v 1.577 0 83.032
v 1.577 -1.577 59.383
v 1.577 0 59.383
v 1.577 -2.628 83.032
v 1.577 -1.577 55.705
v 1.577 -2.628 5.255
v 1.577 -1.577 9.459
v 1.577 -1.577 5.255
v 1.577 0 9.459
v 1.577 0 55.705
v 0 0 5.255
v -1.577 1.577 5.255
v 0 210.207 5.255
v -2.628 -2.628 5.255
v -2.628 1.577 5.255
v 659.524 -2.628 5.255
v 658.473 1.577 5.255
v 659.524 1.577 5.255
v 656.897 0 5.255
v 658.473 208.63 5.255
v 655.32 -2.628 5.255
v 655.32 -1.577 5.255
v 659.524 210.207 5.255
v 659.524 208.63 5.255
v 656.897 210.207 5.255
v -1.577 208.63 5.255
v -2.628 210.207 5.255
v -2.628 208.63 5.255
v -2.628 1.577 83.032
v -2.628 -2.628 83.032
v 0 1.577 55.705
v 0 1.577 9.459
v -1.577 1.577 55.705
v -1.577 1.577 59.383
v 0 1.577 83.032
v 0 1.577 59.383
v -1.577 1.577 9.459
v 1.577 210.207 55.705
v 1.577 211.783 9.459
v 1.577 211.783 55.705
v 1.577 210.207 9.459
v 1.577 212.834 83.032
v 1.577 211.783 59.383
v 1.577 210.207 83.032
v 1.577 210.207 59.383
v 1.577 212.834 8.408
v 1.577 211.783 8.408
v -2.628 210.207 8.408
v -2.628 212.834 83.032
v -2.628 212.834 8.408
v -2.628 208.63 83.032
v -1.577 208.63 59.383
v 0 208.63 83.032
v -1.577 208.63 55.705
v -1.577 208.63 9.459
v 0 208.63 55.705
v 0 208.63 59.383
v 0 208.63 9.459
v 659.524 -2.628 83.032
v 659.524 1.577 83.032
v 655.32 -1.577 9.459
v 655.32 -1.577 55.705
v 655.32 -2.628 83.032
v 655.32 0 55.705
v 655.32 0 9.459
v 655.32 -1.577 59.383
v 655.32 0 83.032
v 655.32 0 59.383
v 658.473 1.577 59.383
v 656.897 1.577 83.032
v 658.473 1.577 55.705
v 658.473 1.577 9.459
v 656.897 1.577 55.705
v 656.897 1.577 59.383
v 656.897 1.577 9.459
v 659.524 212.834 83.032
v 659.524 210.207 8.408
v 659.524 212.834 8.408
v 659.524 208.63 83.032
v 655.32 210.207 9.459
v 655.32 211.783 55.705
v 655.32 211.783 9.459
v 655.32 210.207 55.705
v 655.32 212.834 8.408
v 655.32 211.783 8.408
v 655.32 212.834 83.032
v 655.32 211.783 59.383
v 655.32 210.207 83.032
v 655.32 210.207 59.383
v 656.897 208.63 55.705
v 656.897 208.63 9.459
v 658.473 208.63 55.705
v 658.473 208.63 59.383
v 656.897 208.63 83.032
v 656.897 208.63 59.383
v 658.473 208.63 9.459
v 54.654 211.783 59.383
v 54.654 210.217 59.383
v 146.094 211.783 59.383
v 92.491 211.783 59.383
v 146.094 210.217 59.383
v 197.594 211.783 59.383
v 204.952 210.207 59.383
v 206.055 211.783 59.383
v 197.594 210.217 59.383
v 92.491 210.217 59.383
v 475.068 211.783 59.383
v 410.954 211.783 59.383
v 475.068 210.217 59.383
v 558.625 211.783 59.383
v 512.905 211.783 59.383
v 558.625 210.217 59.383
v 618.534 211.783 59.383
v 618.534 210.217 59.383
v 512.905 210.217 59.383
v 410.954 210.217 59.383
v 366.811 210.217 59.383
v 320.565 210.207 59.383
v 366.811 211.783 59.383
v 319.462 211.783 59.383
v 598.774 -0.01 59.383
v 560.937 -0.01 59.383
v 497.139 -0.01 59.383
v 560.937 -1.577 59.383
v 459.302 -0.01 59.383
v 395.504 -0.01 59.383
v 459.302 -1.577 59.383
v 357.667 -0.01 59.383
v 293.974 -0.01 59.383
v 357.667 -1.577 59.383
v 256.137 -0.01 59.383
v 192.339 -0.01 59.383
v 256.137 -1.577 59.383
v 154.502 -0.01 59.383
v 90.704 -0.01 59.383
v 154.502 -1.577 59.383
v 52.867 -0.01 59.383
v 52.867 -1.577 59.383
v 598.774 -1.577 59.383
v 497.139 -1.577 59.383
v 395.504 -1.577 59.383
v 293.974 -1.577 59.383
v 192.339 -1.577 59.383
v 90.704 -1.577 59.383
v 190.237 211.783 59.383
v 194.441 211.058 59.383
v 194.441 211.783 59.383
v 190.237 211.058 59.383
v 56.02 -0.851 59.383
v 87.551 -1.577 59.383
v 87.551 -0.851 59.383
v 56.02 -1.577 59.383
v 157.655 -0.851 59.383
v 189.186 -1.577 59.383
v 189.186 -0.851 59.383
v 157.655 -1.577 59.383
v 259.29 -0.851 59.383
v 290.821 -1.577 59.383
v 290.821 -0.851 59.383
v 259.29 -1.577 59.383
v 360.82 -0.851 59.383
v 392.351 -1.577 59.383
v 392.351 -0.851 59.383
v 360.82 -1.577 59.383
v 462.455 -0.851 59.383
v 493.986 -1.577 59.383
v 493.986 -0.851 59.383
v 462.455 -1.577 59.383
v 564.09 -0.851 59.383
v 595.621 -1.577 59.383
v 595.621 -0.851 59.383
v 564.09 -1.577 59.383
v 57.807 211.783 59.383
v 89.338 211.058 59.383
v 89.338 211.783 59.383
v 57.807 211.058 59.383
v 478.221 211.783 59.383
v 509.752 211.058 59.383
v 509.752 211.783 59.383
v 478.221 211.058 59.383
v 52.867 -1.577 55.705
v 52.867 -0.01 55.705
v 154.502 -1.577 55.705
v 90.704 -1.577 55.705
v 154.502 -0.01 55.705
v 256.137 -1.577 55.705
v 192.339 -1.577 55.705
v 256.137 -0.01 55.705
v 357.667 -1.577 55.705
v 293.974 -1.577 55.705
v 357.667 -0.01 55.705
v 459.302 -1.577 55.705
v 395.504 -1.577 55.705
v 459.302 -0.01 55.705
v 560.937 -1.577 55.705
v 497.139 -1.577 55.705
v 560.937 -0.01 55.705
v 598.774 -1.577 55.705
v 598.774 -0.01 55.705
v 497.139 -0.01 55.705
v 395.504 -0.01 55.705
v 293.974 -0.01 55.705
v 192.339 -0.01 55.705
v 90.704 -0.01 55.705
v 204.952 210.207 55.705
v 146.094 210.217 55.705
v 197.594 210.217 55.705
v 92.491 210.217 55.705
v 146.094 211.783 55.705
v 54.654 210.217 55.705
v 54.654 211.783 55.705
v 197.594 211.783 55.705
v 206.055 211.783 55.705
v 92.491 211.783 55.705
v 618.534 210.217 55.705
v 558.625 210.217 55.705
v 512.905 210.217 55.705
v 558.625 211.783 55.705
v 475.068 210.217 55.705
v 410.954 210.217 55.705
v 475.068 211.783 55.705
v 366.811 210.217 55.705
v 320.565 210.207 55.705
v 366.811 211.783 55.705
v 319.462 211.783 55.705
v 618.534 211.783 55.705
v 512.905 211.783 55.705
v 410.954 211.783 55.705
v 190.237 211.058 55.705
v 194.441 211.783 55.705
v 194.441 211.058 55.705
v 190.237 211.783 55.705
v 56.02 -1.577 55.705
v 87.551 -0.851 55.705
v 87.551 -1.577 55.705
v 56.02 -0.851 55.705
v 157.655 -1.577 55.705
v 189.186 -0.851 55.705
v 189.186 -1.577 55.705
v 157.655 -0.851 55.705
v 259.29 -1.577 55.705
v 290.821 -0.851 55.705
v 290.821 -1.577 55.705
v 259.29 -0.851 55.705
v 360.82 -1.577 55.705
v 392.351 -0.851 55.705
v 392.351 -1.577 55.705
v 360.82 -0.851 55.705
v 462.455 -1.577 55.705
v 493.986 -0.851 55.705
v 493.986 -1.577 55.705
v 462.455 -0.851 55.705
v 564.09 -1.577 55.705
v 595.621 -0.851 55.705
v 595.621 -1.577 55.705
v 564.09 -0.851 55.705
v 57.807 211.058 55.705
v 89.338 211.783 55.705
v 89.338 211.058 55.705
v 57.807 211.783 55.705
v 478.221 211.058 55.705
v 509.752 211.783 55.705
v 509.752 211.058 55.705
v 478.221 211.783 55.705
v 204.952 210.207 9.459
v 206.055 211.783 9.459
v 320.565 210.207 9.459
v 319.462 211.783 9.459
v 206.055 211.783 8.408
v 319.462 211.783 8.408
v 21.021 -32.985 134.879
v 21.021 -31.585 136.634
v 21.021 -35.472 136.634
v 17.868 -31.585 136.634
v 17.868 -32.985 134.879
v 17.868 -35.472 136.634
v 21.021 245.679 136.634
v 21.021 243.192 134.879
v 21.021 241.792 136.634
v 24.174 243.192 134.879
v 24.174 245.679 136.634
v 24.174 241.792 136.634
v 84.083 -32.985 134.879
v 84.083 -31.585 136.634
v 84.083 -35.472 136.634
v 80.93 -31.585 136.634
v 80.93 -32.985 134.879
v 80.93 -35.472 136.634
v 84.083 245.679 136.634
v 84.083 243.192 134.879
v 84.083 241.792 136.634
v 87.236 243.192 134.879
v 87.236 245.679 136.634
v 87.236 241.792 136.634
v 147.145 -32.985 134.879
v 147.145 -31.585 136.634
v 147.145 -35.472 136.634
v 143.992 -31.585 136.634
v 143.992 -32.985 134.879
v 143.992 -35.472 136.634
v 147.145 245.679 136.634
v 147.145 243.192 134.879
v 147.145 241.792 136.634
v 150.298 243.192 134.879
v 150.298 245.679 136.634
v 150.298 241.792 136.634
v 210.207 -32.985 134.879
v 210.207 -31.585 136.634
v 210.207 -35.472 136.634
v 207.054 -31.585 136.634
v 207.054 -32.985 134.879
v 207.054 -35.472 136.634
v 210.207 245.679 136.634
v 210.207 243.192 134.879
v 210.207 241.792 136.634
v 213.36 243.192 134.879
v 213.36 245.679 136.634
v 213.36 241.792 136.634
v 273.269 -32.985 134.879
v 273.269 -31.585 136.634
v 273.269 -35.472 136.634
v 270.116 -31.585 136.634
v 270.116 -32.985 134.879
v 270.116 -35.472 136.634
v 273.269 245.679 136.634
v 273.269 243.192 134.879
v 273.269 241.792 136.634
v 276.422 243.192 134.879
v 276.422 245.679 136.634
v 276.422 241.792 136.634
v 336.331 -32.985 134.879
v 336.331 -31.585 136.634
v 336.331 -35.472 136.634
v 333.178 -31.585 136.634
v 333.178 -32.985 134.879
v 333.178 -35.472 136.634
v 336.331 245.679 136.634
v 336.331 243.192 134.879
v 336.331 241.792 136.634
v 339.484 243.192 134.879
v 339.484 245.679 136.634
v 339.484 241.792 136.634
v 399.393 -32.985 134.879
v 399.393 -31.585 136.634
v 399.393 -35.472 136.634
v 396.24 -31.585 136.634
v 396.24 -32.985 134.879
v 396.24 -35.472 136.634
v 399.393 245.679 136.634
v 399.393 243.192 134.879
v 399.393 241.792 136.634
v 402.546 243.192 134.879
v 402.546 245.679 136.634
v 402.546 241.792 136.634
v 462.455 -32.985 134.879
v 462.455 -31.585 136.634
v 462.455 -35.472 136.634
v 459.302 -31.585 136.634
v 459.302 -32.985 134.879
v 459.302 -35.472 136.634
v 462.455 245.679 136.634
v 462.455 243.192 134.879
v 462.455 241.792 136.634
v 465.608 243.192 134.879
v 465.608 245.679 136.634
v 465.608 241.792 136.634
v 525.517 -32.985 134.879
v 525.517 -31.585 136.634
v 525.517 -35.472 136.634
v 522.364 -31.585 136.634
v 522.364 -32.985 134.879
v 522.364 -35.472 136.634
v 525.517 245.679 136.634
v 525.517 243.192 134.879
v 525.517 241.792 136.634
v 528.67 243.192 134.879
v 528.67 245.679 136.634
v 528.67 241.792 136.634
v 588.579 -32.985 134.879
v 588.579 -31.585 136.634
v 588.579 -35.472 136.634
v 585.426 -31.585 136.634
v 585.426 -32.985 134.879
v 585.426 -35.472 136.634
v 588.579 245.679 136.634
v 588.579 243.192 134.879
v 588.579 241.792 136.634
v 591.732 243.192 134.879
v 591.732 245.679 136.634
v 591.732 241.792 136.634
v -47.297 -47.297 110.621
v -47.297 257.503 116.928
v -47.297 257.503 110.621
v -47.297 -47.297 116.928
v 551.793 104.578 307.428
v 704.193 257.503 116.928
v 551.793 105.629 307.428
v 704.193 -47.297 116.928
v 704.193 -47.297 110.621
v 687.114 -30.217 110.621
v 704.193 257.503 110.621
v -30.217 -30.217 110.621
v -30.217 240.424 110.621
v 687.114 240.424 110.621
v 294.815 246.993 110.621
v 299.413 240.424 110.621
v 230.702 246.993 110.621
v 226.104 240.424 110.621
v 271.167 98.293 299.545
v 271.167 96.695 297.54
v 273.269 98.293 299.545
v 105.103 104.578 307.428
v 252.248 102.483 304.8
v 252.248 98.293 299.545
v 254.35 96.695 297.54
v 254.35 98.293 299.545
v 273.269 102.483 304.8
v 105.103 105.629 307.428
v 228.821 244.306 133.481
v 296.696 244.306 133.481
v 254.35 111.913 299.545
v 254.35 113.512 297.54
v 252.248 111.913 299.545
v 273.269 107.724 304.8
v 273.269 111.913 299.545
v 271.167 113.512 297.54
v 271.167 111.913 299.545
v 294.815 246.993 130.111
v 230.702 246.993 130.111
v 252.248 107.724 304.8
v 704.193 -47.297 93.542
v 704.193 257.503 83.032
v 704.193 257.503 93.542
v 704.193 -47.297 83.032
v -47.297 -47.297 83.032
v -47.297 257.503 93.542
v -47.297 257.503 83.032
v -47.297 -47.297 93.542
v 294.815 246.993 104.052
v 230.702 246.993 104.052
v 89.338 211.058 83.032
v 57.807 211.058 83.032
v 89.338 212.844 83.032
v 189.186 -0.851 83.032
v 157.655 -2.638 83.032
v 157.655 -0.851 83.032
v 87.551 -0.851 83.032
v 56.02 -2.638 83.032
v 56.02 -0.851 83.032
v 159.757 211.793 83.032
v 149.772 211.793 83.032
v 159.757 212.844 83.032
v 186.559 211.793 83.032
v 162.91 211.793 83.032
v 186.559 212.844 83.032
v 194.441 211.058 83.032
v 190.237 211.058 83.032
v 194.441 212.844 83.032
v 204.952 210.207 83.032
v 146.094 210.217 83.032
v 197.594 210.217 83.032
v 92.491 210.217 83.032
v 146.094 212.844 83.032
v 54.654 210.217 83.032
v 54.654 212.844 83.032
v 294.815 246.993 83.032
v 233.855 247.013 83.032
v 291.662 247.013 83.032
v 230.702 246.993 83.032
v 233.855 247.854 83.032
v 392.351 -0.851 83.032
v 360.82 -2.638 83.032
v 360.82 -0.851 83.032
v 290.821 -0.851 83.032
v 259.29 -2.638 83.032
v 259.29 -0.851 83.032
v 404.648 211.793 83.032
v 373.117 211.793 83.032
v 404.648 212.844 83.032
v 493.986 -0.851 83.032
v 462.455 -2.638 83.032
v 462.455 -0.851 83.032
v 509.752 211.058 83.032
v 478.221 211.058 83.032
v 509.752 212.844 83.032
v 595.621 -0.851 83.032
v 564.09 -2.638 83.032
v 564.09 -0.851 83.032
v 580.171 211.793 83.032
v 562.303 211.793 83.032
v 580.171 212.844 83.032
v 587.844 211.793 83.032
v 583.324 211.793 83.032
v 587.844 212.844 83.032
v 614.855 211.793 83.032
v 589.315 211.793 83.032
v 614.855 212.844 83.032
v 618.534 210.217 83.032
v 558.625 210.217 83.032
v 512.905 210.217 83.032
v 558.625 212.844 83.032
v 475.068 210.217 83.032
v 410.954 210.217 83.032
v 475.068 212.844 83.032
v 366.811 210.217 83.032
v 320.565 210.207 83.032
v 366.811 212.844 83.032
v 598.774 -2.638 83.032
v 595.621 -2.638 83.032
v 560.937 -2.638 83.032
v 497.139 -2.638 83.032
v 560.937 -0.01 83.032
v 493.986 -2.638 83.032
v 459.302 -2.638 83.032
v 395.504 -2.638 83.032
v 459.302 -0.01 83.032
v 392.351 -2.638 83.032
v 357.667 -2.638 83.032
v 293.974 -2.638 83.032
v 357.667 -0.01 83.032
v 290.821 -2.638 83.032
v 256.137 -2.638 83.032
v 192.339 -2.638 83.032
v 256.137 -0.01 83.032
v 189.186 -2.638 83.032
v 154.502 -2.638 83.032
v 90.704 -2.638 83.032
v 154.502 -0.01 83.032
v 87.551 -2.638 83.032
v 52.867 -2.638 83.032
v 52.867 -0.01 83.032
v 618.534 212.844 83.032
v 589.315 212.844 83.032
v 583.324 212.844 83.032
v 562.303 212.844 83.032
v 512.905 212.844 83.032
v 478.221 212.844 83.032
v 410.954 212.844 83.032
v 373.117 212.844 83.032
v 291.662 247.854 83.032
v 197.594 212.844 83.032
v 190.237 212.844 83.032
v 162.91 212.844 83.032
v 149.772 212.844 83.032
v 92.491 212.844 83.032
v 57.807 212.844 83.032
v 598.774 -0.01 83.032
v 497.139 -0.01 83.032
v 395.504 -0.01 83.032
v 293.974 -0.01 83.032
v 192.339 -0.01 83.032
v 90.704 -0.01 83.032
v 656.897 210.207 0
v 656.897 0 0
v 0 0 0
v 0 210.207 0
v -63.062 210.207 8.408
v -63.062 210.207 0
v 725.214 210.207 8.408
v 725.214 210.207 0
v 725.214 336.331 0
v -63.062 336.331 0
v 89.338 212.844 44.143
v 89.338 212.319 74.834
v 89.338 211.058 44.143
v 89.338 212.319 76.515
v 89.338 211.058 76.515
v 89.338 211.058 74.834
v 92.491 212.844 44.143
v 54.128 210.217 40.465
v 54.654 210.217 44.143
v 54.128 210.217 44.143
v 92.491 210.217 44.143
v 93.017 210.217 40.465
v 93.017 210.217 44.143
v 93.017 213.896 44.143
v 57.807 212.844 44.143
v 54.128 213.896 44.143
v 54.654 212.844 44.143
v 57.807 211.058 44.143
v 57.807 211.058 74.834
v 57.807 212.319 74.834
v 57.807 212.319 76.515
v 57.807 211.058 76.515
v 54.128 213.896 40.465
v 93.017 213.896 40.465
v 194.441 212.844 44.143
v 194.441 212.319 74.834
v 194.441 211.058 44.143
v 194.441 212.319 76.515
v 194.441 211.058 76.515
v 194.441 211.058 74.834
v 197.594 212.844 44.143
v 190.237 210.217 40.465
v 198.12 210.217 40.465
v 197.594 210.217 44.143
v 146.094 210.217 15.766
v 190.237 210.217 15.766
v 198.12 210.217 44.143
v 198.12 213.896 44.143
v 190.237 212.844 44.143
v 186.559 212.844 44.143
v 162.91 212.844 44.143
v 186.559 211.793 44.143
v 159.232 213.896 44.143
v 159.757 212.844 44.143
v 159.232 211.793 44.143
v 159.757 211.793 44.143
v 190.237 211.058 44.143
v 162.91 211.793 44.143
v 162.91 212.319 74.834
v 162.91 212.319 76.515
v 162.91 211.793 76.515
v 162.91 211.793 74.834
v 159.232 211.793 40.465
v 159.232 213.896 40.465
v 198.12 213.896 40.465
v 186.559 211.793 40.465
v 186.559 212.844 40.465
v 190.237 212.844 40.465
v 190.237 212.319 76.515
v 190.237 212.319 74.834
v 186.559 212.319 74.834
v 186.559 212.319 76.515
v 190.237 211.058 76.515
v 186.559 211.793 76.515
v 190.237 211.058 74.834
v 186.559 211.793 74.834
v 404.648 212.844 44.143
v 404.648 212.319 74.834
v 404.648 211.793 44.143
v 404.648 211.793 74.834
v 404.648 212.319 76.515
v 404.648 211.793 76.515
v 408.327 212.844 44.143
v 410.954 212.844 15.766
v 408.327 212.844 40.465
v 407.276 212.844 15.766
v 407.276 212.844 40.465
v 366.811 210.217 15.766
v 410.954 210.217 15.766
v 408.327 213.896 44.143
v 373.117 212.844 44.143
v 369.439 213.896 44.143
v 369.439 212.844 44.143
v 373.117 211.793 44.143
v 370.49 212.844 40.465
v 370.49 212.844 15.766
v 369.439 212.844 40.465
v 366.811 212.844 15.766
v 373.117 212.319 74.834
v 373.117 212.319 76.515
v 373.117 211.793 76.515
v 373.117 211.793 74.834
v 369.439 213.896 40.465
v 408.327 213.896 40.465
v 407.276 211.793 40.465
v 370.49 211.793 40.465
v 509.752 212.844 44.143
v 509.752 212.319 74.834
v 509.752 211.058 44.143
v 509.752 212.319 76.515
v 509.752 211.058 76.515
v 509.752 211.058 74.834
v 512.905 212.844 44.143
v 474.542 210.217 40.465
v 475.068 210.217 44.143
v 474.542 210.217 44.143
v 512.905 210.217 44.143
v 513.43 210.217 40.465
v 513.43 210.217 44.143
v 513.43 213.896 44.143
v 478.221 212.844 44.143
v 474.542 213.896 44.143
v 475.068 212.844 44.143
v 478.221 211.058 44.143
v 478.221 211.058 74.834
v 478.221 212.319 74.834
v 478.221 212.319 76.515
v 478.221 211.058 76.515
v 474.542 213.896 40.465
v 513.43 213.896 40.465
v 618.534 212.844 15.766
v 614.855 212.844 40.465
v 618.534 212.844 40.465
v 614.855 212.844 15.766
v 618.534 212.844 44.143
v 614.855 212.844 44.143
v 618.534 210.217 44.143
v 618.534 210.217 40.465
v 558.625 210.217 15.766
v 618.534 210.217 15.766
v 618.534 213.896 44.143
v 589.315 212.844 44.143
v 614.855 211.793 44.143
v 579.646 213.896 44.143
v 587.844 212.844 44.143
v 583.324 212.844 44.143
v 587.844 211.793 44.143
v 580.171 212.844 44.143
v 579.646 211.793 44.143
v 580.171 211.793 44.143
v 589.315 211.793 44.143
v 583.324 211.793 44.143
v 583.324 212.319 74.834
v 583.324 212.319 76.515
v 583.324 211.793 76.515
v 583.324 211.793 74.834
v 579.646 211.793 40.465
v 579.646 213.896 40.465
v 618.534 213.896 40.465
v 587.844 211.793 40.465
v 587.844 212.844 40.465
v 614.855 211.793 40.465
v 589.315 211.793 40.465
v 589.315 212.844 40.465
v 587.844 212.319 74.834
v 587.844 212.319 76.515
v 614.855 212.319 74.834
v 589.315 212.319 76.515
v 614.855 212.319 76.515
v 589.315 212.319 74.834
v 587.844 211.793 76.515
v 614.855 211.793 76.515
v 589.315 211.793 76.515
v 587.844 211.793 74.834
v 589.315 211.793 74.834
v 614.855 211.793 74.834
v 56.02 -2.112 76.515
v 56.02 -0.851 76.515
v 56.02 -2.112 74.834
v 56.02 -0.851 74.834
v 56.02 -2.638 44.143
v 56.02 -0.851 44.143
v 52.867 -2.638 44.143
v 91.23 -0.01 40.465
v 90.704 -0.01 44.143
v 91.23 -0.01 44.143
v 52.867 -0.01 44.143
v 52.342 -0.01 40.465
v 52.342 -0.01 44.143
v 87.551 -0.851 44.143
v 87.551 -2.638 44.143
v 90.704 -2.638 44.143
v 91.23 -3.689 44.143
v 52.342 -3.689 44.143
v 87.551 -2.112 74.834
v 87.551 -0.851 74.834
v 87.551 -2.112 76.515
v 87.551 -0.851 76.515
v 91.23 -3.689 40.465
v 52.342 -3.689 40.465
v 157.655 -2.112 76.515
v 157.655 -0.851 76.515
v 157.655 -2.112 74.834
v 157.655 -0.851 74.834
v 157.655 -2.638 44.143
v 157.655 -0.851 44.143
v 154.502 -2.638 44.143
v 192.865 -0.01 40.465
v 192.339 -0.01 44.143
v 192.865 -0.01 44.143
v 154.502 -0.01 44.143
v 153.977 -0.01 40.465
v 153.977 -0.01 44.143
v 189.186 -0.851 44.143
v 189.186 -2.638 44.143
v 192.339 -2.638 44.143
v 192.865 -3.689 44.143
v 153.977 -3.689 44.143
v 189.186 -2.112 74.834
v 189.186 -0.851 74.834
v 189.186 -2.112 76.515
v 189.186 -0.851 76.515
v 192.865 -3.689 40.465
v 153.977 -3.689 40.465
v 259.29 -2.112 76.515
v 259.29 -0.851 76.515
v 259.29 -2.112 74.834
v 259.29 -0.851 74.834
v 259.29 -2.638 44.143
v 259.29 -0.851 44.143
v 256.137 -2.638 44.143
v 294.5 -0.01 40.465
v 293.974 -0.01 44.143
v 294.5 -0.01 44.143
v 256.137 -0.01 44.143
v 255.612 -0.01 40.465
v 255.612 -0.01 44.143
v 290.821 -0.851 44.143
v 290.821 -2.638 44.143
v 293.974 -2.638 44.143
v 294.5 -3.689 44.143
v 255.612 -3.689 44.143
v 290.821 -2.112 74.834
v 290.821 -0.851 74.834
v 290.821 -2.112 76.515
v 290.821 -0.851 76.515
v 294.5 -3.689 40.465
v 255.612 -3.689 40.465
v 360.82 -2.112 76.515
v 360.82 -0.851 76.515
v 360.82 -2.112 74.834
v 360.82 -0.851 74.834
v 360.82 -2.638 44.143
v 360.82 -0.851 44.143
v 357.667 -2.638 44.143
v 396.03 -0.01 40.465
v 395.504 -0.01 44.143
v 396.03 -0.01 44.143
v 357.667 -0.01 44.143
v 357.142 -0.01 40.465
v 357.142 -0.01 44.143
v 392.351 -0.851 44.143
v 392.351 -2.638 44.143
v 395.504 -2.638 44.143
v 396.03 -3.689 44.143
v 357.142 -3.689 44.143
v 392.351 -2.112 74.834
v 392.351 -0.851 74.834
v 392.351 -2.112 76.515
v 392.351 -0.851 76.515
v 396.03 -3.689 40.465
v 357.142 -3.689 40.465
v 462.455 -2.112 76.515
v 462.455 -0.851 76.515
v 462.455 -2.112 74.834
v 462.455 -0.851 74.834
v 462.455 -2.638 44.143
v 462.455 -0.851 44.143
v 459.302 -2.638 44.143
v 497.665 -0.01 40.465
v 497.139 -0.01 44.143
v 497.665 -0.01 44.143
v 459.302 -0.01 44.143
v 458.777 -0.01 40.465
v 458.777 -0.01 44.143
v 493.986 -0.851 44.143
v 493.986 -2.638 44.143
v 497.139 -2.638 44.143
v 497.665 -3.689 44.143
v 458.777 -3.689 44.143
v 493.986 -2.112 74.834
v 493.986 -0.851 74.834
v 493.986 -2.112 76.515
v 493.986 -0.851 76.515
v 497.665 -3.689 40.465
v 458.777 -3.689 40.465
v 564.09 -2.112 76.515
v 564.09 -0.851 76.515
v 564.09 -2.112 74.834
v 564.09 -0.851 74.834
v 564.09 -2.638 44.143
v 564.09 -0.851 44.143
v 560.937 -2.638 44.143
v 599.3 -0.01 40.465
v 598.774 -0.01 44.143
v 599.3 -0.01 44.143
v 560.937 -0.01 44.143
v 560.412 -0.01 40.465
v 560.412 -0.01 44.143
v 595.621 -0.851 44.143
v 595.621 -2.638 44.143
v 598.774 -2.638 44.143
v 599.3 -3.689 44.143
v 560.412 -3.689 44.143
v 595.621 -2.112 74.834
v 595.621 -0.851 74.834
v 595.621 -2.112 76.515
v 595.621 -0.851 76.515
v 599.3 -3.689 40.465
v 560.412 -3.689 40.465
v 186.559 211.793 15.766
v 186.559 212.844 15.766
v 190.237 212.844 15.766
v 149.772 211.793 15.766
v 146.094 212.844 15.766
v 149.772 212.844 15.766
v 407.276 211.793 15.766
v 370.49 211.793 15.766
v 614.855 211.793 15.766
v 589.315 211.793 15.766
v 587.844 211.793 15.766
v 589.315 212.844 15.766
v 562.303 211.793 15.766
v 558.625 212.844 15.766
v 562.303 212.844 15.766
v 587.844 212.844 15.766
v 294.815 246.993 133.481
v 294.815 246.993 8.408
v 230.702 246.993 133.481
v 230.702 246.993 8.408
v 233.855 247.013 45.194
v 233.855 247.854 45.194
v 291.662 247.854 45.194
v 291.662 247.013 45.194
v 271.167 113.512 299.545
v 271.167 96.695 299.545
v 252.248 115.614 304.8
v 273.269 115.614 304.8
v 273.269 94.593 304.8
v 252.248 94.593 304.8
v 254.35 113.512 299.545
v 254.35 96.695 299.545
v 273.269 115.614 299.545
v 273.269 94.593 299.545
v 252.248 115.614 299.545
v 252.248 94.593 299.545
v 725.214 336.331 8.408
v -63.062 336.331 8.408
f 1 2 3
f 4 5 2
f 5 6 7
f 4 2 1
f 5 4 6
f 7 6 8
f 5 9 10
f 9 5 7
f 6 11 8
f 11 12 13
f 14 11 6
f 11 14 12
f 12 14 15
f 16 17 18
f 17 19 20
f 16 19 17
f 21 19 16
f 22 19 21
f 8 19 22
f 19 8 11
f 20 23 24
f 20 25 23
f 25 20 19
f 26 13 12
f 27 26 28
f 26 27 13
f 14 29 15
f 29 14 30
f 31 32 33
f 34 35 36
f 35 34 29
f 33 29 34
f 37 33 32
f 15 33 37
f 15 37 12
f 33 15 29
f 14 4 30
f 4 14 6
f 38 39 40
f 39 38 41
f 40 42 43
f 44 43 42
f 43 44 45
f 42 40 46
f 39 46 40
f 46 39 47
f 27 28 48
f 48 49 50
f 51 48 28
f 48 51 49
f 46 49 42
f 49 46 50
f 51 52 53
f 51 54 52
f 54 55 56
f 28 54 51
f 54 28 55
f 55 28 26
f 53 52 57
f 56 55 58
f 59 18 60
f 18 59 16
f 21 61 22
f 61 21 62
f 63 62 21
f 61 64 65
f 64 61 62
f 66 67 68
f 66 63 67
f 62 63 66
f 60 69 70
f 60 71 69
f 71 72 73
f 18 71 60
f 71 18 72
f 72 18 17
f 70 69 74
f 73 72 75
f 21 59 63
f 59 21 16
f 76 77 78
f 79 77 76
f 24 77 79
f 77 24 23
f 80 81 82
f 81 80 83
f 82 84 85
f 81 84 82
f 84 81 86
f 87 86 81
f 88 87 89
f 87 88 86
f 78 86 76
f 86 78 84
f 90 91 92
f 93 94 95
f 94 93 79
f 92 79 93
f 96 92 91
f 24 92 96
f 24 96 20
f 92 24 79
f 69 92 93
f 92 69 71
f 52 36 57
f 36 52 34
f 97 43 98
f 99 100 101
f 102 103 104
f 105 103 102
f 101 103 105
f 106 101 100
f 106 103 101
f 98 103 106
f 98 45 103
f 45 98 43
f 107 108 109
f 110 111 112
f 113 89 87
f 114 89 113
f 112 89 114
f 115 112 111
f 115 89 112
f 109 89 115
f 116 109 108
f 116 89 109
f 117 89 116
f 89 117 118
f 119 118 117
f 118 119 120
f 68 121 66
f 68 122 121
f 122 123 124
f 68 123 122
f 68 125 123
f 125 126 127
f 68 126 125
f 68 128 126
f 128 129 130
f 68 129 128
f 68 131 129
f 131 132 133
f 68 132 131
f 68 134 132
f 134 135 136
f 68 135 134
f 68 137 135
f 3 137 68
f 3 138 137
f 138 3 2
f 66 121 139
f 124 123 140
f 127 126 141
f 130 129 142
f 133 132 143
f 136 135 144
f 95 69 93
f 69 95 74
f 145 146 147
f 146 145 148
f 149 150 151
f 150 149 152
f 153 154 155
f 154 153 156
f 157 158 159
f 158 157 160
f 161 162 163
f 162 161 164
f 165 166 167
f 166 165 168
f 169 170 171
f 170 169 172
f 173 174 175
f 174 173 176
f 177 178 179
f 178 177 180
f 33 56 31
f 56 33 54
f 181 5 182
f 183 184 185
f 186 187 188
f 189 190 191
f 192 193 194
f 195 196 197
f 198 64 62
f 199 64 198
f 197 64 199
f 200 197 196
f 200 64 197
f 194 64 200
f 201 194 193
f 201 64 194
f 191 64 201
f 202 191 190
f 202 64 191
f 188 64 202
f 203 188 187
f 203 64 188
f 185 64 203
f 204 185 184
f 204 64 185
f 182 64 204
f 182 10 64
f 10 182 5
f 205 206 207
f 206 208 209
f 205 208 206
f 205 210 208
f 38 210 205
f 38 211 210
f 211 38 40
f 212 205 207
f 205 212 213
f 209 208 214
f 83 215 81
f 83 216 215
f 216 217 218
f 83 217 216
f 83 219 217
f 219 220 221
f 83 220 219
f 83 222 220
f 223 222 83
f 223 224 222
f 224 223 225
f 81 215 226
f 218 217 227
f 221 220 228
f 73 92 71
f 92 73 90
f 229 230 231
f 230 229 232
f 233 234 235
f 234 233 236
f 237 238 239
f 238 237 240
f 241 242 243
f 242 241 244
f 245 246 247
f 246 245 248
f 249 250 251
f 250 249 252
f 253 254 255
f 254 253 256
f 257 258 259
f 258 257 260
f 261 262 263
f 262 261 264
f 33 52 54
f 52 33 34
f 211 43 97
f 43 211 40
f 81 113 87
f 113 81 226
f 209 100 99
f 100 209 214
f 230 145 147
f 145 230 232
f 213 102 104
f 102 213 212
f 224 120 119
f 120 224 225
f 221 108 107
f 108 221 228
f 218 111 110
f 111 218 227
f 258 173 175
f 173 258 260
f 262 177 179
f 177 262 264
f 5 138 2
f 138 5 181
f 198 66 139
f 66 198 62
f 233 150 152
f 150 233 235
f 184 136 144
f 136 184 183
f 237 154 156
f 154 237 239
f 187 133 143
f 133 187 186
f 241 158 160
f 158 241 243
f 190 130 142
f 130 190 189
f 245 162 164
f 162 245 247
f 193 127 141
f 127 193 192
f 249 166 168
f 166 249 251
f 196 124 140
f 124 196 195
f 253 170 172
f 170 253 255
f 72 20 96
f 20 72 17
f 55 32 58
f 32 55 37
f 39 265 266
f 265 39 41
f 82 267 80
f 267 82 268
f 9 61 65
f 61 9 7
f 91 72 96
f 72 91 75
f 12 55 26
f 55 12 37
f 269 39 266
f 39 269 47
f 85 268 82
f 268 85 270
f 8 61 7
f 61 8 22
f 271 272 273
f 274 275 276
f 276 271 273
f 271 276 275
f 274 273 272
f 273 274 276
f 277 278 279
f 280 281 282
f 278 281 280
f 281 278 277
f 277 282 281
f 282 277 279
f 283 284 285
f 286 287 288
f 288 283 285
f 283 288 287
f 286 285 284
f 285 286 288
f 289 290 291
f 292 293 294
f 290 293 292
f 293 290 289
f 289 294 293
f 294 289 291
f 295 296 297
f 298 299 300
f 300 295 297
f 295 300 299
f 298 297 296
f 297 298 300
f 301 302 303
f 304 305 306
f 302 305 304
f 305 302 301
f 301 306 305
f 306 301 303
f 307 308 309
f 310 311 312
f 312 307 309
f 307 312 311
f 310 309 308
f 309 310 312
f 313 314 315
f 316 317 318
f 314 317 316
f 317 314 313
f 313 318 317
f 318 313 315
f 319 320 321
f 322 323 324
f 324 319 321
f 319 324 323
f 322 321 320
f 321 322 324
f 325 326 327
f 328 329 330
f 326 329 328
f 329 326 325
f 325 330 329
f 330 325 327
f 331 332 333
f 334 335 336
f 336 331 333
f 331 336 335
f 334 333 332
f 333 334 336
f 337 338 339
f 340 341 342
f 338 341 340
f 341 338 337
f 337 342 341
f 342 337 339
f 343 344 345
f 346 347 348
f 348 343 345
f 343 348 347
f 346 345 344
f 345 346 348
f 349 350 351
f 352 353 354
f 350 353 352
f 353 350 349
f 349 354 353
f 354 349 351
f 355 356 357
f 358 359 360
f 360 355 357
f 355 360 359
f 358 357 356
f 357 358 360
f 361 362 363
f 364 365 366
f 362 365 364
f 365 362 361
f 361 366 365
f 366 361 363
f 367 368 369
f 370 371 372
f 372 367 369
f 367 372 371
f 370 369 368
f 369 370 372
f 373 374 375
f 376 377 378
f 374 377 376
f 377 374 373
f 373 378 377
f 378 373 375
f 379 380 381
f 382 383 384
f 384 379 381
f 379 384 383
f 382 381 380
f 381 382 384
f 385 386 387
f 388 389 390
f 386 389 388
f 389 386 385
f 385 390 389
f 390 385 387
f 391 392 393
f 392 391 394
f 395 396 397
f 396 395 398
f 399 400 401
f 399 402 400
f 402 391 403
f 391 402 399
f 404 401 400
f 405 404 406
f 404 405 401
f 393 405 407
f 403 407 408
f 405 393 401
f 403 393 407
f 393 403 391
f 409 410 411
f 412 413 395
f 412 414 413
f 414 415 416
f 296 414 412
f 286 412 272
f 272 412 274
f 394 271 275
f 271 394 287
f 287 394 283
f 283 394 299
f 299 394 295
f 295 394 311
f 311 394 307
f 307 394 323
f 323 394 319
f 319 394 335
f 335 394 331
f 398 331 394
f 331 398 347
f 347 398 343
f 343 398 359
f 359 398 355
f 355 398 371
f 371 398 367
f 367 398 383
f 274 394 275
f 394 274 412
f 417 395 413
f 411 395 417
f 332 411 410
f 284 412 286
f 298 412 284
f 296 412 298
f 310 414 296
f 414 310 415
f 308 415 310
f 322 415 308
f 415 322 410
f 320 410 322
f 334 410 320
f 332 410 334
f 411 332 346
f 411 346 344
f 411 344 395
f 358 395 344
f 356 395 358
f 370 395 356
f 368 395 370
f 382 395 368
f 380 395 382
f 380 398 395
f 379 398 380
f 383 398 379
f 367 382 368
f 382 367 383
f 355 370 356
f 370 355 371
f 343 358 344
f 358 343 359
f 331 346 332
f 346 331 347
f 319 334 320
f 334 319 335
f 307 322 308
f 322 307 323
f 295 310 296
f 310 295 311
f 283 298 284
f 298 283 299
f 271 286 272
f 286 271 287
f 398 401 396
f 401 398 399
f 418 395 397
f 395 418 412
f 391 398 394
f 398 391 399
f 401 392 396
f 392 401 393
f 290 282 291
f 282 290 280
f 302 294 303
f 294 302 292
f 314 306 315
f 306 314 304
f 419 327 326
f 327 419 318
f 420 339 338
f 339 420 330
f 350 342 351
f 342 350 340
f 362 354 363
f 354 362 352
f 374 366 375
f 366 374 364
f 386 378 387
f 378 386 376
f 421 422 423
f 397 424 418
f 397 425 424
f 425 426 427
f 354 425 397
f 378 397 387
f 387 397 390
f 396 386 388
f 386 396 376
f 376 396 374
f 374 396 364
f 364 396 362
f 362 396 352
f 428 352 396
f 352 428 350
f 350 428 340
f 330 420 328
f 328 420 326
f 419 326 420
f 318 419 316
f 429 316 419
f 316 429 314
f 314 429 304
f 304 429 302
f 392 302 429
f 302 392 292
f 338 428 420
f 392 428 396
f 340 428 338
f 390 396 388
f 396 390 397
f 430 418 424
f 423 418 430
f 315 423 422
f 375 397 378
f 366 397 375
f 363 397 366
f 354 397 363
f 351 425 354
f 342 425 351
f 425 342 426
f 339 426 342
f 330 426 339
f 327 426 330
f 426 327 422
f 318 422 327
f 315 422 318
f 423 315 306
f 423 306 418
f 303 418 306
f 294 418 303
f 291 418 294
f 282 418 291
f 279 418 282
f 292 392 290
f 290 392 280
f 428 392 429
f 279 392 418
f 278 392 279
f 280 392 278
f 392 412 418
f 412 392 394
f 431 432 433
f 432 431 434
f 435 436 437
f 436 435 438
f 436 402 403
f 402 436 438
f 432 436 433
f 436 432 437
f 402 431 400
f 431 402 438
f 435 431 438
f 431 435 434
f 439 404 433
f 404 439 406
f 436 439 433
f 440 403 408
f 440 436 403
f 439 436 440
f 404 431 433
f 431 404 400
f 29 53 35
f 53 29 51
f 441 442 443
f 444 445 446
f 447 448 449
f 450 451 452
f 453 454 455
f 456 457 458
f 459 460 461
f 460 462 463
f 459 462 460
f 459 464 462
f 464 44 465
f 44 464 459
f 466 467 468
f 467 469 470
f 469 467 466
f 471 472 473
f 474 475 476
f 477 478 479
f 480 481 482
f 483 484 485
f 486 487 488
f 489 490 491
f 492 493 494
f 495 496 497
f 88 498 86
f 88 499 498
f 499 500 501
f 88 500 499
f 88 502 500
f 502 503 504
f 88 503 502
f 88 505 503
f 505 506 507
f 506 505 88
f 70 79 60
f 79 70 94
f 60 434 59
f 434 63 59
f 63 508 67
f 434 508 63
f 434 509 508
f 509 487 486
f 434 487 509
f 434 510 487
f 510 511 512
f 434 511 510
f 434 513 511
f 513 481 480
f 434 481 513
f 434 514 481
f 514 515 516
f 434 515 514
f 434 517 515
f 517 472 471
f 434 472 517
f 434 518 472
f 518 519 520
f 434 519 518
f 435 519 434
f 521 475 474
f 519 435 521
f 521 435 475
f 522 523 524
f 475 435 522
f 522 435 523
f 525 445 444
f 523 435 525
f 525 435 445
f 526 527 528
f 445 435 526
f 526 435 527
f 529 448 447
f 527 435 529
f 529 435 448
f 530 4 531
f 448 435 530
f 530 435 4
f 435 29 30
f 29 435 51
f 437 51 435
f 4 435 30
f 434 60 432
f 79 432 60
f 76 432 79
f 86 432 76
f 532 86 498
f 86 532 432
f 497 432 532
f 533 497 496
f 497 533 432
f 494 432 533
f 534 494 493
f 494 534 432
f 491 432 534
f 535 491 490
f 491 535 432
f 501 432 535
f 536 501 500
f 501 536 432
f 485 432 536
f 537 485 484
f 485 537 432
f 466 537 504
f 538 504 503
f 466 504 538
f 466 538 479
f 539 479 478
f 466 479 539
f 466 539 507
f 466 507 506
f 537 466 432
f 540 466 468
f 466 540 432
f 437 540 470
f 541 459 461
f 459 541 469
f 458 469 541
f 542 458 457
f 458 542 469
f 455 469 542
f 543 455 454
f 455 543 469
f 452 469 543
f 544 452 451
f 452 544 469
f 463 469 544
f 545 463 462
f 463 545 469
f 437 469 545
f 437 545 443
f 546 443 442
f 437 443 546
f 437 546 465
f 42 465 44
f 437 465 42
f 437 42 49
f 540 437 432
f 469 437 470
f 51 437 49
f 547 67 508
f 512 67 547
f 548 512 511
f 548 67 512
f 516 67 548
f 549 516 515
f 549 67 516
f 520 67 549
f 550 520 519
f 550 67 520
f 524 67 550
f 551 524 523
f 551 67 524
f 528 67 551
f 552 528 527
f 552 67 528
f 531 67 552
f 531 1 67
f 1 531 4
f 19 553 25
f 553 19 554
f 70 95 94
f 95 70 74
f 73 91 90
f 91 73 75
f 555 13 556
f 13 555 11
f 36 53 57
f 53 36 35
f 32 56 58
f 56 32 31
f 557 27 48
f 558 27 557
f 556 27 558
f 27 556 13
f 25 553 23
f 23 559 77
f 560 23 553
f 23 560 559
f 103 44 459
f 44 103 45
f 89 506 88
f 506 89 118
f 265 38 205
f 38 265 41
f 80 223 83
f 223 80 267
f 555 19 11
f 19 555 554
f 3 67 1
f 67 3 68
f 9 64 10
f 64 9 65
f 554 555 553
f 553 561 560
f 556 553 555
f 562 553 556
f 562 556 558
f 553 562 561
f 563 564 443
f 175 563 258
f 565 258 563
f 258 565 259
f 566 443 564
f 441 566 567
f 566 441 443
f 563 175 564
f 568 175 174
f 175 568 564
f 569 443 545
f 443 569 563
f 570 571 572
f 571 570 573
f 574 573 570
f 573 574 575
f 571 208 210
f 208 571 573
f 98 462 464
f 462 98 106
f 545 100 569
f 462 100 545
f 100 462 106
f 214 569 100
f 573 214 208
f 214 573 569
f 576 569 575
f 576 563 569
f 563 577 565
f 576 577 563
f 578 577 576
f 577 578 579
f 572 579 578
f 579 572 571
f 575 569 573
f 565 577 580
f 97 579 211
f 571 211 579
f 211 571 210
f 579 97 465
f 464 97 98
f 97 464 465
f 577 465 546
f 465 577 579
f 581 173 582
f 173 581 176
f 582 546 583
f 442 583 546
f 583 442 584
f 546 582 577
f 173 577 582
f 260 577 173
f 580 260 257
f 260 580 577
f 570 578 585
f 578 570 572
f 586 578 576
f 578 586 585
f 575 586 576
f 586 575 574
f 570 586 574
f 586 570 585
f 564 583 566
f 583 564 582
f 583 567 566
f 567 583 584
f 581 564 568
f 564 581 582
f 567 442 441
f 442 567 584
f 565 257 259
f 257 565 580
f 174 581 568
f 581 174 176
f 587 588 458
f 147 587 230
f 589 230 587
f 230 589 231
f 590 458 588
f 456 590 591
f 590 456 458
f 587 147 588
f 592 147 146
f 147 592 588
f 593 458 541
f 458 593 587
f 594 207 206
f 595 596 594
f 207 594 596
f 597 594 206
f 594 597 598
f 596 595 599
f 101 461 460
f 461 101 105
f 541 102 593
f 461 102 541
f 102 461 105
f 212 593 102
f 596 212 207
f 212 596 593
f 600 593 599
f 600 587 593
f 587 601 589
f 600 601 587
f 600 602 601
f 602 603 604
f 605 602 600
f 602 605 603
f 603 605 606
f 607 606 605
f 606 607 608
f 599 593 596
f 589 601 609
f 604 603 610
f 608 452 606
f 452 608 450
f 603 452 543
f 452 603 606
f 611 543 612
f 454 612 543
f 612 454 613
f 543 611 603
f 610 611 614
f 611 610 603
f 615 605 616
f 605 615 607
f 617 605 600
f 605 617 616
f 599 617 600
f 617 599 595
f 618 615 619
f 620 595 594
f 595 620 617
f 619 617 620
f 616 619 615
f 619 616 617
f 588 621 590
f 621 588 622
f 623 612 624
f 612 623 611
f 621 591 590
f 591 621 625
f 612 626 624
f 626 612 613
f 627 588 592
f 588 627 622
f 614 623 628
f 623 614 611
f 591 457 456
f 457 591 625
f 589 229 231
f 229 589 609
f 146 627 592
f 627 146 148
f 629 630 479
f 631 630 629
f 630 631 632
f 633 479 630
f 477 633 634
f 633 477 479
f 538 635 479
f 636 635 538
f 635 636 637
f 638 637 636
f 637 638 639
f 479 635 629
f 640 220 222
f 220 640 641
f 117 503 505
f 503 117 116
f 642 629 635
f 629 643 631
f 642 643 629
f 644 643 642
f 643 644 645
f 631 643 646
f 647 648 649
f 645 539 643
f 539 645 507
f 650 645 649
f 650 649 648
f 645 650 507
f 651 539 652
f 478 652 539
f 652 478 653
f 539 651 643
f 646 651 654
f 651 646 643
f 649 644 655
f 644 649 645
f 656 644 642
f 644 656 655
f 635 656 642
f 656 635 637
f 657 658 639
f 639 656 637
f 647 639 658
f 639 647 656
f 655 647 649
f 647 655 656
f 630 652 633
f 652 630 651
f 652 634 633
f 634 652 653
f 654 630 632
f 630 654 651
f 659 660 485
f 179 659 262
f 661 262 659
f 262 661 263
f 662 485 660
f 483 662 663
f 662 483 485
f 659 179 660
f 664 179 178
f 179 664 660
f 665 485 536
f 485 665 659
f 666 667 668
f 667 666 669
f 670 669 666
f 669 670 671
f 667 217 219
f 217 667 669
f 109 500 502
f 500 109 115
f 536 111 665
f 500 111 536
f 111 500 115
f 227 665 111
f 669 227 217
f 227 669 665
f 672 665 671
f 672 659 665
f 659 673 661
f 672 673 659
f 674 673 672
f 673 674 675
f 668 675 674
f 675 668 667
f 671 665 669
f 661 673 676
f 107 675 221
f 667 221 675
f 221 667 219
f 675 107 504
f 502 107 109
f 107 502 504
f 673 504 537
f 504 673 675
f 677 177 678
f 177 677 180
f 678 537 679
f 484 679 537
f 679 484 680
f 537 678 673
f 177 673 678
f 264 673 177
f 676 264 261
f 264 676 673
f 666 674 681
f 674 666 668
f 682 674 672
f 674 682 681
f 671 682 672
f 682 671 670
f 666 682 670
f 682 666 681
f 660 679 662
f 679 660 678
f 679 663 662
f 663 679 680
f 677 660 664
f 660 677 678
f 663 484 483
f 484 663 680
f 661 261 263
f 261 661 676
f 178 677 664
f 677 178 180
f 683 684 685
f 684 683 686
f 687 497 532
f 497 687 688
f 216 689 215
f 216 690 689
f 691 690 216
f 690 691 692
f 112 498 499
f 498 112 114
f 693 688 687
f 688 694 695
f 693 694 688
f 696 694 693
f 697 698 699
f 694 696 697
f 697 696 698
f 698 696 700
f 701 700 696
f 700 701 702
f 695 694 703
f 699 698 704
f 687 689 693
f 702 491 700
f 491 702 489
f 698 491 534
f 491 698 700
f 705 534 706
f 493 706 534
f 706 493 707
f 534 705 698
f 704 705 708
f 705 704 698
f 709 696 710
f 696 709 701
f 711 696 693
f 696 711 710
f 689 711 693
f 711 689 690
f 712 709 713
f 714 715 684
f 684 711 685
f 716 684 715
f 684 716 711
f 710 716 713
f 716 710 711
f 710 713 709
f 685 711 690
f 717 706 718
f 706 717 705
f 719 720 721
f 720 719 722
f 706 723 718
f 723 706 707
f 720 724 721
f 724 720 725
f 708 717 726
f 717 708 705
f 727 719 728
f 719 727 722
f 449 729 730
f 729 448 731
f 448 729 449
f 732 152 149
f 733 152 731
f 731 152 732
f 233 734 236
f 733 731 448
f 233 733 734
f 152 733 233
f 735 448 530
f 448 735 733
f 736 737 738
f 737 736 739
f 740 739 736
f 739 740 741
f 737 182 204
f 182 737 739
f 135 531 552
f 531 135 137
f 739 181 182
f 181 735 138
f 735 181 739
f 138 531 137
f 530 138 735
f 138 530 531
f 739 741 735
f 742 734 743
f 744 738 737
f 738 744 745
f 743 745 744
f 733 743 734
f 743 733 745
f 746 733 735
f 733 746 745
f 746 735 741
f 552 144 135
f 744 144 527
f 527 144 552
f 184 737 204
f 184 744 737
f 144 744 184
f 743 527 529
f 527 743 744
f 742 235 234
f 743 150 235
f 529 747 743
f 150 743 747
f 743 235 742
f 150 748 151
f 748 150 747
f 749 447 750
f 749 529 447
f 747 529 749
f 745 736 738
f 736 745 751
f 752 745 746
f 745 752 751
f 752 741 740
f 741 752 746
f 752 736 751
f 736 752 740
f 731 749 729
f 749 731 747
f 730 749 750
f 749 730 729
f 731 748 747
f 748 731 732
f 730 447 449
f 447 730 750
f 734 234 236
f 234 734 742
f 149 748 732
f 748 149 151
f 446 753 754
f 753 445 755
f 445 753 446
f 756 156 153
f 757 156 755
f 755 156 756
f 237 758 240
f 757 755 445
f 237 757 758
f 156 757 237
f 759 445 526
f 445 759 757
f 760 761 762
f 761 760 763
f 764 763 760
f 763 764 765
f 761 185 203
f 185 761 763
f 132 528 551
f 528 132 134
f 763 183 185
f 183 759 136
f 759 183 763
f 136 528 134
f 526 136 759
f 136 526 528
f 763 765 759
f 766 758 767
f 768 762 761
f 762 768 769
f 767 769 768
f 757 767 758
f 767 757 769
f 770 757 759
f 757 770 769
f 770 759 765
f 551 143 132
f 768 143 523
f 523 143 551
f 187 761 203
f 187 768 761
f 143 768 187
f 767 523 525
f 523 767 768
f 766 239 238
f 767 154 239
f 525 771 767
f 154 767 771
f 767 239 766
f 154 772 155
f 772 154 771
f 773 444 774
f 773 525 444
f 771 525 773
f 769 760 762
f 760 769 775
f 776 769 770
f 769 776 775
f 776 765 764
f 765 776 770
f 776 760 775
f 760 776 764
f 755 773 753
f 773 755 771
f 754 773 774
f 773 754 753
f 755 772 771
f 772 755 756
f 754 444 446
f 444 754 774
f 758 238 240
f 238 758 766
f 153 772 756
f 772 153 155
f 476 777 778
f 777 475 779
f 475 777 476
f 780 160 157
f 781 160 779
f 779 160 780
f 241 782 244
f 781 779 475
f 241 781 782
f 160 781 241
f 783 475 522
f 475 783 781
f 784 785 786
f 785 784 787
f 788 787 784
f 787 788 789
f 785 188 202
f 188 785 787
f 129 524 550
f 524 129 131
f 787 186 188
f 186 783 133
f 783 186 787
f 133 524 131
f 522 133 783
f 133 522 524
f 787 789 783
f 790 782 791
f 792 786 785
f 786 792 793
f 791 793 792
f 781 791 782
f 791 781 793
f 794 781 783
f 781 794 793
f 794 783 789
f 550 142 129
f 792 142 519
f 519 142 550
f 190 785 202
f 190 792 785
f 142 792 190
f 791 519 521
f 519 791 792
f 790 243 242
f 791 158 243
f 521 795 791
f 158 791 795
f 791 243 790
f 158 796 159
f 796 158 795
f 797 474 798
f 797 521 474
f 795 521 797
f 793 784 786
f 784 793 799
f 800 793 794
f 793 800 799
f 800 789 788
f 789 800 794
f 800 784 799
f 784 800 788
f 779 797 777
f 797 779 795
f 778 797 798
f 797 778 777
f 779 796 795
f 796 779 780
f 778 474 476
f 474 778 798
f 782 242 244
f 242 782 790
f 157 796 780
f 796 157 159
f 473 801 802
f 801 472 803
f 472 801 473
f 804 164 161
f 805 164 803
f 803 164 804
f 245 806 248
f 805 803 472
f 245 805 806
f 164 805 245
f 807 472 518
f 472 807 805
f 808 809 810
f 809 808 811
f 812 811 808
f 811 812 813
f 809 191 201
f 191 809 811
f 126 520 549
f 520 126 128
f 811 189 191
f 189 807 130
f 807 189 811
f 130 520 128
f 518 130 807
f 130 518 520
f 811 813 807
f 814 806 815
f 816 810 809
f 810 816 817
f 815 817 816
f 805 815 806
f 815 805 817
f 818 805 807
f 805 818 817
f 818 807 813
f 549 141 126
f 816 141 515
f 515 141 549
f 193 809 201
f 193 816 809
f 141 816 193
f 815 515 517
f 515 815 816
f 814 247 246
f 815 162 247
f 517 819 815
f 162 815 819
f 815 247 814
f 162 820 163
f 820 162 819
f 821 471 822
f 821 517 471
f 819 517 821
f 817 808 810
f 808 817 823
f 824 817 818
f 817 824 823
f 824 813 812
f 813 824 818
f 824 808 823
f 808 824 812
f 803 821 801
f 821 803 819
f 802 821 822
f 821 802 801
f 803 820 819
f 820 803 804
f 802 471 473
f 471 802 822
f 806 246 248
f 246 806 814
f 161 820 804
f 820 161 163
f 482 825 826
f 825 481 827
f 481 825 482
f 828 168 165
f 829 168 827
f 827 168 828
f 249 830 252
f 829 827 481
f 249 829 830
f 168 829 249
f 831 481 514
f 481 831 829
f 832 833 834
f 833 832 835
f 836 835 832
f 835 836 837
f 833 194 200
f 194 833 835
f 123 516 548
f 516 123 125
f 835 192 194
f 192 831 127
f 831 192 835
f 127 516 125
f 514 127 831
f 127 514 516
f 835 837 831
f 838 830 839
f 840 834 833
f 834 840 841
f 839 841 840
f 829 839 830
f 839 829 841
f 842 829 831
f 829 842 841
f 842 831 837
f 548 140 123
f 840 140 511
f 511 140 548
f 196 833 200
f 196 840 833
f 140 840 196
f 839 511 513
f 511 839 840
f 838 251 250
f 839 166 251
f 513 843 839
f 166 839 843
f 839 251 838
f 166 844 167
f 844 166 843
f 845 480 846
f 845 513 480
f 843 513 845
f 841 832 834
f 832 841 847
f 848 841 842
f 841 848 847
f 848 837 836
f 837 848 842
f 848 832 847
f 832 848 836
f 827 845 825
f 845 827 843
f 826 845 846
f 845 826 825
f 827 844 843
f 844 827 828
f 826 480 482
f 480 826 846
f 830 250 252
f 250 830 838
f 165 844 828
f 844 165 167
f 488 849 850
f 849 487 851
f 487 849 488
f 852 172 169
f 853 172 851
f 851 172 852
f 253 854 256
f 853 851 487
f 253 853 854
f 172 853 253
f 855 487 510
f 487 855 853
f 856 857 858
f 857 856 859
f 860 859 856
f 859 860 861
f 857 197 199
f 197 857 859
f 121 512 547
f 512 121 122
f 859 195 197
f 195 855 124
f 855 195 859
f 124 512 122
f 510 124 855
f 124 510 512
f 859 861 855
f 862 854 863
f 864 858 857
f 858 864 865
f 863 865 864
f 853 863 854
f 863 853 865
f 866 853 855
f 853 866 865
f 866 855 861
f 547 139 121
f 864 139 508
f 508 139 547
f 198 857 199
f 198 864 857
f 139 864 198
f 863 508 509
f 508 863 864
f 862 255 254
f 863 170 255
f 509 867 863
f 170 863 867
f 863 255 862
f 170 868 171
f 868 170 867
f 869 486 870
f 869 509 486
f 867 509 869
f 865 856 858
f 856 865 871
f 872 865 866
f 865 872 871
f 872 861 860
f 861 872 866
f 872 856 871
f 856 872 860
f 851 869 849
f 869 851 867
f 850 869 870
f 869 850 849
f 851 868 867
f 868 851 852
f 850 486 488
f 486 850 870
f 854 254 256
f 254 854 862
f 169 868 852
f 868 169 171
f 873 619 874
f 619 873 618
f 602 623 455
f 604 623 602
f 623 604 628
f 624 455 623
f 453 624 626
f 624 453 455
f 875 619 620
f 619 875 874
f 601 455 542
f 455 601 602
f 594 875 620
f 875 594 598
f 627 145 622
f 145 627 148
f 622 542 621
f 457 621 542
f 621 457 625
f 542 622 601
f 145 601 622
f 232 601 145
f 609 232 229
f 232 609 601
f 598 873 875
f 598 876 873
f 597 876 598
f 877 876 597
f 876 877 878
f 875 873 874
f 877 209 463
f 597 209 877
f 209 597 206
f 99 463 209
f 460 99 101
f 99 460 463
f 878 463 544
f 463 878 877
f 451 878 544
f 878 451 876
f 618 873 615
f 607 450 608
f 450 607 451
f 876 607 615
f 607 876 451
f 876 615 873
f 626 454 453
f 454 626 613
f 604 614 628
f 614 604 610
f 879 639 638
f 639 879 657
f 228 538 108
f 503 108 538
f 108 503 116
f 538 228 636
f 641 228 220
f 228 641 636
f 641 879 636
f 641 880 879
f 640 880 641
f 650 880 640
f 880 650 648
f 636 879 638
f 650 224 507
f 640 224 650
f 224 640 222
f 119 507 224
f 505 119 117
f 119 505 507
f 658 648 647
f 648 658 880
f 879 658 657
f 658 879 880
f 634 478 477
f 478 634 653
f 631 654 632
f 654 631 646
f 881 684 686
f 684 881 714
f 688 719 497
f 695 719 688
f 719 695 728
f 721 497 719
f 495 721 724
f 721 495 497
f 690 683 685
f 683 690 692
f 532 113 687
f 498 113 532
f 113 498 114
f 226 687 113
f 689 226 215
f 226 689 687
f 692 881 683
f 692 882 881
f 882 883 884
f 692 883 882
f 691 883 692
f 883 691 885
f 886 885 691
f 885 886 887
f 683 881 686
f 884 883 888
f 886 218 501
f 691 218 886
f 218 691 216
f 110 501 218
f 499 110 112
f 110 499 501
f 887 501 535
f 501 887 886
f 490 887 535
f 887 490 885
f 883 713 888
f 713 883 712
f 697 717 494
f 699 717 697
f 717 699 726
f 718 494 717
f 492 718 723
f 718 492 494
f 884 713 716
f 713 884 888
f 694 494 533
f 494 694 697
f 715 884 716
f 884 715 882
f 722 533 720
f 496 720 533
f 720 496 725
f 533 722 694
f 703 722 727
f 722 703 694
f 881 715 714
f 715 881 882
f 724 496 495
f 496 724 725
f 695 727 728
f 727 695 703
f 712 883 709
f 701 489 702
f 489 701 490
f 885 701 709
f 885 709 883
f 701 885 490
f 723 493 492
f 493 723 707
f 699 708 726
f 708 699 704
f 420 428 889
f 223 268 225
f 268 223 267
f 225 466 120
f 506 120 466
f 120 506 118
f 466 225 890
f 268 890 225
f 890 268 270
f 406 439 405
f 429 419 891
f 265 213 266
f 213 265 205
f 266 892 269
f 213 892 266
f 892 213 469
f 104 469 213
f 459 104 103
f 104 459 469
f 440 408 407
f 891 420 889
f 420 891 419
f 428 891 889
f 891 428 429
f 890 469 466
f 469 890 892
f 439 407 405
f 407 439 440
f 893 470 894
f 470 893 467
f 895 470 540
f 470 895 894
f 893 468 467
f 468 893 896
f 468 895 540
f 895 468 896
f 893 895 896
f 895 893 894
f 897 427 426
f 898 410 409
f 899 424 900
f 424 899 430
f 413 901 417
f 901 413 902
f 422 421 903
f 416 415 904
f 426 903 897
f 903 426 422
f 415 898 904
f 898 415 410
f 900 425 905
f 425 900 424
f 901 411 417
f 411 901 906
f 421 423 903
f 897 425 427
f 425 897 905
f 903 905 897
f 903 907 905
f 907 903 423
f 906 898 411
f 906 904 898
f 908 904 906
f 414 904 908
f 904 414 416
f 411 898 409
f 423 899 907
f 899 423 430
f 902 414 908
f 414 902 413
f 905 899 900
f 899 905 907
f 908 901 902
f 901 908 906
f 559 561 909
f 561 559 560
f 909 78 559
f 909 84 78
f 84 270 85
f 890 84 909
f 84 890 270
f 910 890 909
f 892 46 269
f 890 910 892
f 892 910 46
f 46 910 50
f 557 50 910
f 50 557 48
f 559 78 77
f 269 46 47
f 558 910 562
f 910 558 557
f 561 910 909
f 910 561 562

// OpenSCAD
// =====================================================================
//  MILWAUKEE ROAD - MONROE, WIS. PASSENGER DEPOT (J. T. W. JENNINGS)
//  Source: Album sheet 144 (marked 14), drawing 2005, July 1888 (J. T. W. Jennings).  Drawings are private reference (in copyright):
//  Research Library / RSW / Stations / Standard depots / Album of Depot Plans 1919.
//  Rib Side Works, 24 Nov 2026. FIRST SHAPE MODEL for review - not cut into print sections.
//  KNOWN (from the sheet): 62 ft 6 in x 20 ft; two waiting rooms 24 ft 3, octagonal office bay 11 ft, baggage 12 ft; steep hipped roof with flared eaves, gabled dormer, iron cresting; lap siding with vertical boards below.
//  ESTIMATE: wall and ridge heights where not written, window count and spacing, colours.
//  Built with the shared depot builder ../../../_common/rsw_depot.scad (x along the track,
//  y = 0 town side, track side +y, feet).  SCALE: 29 = G, 48 = O, 87 = HO.
// =====================================================================
SCALE = 29;
include <../../../_common/rsw_depot.scad>

depot(blocks = [[0, 62.5, 0, 20, 13, 1.0, 3, 4.5, 0]],
      pavs   = [],
      wins   = [[7.0, 1, 3, 6, 4.2], [17.0, 1, 3, 6, 4.2], [27.0, 1, 3, 6, 4.2], [37.0, 1, 3, 6, 4.2], [47.0, 1, 3, 6, 4.2], [57.0, 1, 3, 6, 4.2], [6.83, 0, 3, 6, 4.2], [16.5, 0, 3, 6, 4.2], [26.17, 0, 3, 6, 4.2], [35.83, 0, 3, 6, 4.2], [45.5, 0, 3, 6, 4.2], [55.17, 0, 3, 6, 4.2]],
      doors  = [[16, 1, 3.5, 8, 0], [37, 1, 3.5, 8, 0], [56, 1, 5, 8, 1]],
      bays   = [[25, 1, 11, 3.5]],
      chims  = [[25, 10, 29]],
      plat   = [-6, 75, 12, 0.8]);
